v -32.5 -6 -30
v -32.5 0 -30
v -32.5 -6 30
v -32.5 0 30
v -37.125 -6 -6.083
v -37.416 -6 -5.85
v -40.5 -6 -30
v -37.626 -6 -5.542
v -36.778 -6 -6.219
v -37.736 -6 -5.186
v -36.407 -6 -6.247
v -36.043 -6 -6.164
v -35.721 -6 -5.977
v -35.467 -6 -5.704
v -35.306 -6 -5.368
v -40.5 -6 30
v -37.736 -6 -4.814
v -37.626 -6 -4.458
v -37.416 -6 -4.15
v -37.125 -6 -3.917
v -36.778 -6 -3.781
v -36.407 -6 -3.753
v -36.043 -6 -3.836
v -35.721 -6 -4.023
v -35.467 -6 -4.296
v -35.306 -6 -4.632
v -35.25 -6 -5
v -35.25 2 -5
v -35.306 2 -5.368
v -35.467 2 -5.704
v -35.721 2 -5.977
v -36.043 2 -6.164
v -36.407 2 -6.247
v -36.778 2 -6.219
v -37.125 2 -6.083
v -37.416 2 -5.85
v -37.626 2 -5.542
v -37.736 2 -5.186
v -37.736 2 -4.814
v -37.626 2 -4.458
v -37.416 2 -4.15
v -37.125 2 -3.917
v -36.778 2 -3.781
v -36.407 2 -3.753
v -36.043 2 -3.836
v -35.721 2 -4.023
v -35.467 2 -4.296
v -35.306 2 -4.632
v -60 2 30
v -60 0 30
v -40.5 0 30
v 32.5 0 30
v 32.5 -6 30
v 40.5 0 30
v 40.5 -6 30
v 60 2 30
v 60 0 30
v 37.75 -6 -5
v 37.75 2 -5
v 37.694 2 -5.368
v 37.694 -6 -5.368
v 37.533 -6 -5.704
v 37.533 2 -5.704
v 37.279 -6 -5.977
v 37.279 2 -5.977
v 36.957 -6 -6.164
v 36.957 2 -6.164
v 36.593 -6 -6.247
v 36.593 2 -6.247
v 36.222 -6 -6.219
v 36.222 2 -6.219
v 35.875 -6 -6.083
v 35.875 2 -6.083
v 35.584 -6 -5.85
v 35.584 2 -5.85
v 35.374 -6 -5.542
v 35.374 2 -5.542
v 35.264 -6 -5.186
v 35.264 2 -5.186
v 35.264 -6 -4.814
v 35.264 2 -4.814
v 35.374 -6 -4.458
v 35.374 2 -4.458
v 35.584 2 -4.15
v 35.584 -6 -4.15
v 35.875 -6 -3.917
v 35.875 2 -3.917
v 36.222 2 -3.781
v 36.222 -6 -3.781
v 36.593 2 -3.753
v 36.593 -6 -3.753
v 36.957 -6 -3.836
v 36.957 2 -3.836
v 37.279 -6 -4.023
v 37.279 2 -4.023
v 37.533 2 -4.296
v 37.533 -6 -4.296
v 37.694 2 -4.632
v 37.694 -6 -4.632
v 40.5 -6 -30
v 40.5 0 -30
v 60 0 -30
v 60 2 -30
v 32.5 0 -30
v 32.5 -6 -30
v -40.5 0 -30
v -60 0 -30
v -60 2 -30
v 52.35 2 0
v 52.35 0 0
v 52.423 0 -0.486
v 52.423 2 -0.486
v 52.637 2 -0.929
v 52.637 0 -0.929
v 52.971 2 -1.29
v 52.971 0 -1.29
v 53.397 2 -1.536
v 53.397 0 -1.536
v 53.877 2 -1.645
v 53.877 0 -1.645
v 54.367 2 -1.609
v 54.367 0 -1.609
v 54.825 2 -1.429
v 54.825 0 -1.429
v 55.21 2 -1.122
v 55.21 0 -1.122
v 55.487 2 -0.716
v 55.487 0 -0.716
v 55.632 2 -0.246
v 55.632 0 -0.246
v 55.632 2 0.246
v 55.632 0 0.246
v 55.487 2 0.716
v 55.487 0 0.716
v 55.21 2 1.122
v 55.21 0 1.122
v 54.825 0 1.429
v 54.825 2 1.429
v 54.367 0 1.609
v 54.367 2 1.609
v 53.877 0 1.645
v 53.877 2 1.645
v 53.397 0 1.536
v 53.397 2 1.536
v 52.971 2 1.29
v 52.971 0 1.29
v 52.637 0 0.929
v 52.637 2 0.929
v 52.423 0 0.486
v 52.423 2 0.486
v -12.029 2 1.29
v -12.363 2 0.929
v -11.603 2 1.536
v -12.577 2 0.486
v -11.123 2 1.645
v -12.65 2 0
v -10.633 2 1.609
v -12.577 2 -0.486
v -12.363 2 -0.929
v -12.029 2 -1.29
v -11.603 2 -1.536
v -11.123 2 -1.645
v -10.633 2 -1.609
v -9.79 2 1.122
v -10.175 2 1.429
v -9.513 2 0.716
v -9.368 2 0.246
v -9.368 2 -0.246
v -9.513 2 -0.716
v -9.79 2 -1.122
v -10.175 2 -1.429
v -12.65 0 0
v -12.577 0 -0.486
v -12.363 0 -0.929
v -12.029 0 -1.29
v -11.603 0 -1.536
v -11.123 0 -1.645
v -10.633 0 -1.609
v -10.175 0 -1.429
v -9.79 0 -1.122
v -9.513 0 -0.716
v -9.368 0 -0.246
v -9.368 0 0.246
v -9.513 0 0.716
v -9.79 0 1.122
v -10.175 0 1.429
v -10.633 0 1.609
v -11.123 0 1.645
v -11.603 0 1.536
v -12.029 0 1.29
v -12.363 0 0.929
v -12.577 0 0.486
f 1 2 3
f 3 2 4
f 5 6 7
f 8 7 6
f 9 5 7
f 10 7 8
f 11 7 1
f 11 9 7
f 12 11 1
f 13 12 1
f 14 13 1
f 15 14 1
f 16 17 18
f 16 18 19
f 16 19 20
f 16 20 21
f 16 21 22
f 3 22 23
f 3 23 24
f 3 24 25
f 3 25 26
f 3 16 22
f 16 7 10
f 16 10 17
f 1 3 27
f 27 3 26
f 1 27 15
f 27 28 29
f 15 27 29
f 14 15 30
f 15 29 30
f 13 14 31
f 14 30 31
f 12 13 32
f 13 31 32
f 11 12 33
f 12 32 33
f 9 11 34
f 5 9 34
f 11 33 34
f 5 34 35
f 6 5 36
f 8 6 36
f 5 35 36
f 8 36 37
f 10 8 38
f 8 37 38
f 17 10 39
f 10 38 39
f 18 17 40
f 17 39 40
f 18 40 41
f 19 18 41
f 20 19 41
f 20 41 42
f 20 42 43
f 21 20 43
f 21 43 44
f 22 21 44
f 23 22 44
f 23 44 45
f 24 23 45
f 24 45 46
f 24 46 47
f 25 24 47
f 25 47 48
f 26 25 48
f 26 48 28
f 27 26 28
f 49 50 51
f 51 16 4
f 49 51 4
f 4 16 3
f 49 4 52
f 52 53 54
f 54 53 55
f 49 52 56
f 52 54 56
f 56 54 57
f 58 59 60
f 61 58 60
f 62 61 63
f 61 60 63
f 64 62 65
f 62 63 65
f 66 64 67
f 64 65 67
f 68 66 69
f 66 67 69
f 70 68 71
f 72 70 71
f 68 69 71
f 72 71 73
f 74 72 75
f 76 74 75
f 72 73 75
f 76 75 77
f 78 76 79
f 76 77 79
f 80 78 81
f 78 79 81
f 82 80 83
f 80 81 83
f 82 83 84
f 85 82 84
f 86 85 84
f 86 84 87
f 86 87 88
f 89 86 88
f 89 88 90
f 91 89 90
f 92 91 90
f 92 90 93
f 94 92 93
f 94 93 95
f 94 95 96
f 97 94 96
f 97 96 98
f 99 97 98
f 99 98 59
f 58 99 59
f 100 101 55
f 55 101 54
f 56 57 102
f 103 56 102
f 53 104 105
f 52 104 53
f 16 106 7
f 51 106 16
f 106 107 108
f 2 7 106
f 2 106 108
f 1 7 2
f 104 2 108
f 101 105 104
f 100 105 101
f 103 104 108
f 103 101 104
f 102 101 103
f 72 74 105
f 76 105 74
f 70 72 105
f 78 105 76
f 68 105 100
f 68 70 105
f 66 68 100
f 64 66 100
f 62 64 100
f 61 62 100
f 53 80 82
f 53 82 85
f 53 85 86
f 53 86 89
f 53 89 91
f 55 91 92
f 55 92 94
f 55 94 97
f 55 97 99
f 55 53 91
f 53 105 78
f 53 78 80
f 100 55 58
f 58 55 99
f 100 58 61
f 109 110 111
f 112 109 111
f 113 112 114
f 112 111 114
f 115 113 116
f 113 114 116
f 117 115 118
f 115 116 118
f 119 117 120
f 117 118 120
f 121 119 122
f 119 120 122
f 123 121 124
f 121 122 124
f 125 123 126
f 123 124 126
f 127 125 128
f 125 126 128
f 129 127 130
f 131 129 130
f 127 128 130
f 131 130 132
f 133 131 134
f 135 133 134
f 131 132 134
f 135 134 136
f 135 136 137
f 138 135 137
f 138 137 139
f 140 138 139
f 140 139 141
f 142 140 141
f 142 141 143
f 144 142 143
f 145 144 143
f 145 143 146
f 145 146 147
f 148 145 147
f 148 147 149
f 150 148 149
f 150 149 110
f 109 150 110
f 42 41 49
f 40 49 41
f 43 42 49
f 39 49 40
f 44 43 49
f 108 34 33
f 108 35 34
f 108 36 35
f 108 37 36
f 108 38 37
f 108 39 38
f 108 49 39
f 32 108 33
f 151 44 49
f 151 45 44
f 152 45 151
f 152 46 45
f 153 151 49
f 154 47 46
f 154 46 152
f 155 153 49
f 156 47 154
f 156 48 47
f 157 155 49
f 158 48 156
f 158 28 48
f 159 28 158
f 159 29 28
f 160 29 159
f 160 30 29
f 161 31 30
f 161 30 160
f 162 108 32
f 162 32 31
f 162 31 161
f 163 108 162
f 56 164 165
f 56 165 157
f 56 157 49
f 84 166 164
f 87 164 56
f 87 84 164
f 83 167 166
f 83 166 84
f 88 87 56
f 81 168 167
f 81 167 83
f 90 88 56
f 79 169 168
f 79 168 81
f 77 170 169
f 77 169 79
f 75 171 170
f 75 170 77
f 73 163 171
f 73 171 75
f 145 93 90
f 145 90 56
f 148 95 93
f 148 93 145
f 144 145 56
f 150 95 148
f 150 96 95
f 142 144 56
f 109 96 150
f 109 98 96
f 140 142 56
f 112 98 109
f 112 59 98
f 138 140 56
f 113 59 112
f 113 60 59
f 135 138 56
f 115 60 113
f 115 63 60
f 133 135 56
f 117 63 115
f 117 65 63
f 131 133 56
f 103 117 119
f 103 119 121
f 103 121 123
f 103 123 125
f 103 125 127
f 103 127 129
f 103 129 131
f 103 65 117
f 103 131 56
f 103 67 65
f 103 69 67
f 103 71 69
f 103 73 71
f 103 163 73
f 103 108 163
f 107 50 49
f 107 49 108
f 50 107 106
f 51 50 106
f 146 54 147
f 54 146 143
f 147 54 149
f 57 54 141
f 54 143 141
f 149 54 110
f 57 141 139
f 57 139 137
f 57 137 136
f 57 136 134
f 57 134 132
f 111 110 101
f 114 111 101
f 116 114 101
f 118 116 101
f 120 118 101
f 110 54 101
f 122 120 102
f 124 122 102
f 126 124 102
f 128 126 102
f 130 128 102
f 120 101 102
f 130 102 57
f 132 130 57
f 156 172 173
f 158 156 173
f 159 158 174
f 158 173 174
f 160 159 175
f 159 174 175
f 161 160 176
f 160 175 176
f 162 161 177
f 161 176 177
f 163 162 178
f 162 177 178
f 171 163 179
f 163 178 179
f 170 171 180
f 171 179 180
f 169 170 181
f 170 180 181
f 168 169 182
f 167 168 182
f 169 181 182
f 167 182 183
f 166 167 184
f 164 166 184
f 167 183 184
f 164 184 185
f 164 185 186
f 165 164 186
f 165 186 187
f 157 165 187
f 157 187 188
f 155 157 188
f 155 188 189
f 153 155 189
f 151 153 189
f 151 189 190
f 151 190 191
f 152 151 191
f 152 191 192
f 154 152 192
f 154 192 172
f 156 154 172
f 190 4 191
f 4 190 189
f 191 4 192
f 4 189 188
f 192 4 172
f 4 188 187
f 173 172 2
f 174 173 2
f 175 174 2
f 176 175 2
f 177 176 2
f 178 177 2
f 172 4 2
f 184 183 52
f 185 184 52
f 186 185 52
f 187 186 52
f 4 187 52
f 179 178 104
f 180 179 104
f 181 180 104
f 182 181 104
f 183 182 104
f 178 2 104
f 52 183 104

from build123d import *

# Parameters (mm, degrees)
SKETCH_1_W             = 120
SKETCH_1_H             = 60
EXTRUDE_1_DEPTH        = 2
SKETCH_2_W             = 8
SKETCH_2_H             = 60
EXTRUDE_2_DEPTH        = 6
HOLE_WIZARD_M3_1_D     = 2.5
HOLE_WIZARD_M3_1_DEPTH = 8.5
HOLE_WIZARD_M3_1_TIP   = 0.751075774
HOLE_WIZARD_M4_1_D     = 3.3


with BuildPart() as part:
    # 草图1 → 凸台-拉伸1 (new body)
    with BuildSketch(Plane(origin=(0, 0, 0), x_dir=(1, 0, 0), z_dir=(0, 1, 0))):
        Rectangle(SKETCH_1_W, SKETCH_1_H)
    extrude(amount=EXTRUDE_1_DEPTH)

    # 草图2 → 凸台-拉伸2 (add)
    with BuildSketch(Plane.XZ):
        with Locations((-36.5, 0)):
            Rectangle(SKETCH_2_W, SKETCH_2_H)
        with Locations((36.5, 0)):
            Rectangle(SKETCH_2_W, SKETCH_2_H)
    extrude(amount=EXTRUDE_2_DEPTH)

    # M3 螺纹孔1
    with Locations(Plane(origin=(0, -6, 0), x_dir=(-1, 0, 0), z_dir=(0, -1, 0))):
        with Locations((36.5, 5), (-36.5, 5)):
            Hole(HOLE_WIZARD_M3_1_D / 2, depth=HOLE_WIZARD_M3_1_DEPTH)
            with Locations((0, 0, -(HOLE_WIZARD_M3_1_DEPTH + HOLE_WIZARD_M3_1_TIP / 2))):  # 118° drill point
                Cone(0, HOLE_WIZARD_M3_1_D / 2, HOLE_WIZARD_M3_1_TIP, mode=Mode.SUBTRACT)

    # M4 螺纹孔1 (through all)
    with Locations(Plane(origin=(0, 2, 0), x_dir=(1, 0, 0), z_dir=(0, 1, 0))):
        with Locations((54, 0), (-11, 0)):
            Hole(HOLE_WIZARD_M4_1_D / 2)


solid = part.part
